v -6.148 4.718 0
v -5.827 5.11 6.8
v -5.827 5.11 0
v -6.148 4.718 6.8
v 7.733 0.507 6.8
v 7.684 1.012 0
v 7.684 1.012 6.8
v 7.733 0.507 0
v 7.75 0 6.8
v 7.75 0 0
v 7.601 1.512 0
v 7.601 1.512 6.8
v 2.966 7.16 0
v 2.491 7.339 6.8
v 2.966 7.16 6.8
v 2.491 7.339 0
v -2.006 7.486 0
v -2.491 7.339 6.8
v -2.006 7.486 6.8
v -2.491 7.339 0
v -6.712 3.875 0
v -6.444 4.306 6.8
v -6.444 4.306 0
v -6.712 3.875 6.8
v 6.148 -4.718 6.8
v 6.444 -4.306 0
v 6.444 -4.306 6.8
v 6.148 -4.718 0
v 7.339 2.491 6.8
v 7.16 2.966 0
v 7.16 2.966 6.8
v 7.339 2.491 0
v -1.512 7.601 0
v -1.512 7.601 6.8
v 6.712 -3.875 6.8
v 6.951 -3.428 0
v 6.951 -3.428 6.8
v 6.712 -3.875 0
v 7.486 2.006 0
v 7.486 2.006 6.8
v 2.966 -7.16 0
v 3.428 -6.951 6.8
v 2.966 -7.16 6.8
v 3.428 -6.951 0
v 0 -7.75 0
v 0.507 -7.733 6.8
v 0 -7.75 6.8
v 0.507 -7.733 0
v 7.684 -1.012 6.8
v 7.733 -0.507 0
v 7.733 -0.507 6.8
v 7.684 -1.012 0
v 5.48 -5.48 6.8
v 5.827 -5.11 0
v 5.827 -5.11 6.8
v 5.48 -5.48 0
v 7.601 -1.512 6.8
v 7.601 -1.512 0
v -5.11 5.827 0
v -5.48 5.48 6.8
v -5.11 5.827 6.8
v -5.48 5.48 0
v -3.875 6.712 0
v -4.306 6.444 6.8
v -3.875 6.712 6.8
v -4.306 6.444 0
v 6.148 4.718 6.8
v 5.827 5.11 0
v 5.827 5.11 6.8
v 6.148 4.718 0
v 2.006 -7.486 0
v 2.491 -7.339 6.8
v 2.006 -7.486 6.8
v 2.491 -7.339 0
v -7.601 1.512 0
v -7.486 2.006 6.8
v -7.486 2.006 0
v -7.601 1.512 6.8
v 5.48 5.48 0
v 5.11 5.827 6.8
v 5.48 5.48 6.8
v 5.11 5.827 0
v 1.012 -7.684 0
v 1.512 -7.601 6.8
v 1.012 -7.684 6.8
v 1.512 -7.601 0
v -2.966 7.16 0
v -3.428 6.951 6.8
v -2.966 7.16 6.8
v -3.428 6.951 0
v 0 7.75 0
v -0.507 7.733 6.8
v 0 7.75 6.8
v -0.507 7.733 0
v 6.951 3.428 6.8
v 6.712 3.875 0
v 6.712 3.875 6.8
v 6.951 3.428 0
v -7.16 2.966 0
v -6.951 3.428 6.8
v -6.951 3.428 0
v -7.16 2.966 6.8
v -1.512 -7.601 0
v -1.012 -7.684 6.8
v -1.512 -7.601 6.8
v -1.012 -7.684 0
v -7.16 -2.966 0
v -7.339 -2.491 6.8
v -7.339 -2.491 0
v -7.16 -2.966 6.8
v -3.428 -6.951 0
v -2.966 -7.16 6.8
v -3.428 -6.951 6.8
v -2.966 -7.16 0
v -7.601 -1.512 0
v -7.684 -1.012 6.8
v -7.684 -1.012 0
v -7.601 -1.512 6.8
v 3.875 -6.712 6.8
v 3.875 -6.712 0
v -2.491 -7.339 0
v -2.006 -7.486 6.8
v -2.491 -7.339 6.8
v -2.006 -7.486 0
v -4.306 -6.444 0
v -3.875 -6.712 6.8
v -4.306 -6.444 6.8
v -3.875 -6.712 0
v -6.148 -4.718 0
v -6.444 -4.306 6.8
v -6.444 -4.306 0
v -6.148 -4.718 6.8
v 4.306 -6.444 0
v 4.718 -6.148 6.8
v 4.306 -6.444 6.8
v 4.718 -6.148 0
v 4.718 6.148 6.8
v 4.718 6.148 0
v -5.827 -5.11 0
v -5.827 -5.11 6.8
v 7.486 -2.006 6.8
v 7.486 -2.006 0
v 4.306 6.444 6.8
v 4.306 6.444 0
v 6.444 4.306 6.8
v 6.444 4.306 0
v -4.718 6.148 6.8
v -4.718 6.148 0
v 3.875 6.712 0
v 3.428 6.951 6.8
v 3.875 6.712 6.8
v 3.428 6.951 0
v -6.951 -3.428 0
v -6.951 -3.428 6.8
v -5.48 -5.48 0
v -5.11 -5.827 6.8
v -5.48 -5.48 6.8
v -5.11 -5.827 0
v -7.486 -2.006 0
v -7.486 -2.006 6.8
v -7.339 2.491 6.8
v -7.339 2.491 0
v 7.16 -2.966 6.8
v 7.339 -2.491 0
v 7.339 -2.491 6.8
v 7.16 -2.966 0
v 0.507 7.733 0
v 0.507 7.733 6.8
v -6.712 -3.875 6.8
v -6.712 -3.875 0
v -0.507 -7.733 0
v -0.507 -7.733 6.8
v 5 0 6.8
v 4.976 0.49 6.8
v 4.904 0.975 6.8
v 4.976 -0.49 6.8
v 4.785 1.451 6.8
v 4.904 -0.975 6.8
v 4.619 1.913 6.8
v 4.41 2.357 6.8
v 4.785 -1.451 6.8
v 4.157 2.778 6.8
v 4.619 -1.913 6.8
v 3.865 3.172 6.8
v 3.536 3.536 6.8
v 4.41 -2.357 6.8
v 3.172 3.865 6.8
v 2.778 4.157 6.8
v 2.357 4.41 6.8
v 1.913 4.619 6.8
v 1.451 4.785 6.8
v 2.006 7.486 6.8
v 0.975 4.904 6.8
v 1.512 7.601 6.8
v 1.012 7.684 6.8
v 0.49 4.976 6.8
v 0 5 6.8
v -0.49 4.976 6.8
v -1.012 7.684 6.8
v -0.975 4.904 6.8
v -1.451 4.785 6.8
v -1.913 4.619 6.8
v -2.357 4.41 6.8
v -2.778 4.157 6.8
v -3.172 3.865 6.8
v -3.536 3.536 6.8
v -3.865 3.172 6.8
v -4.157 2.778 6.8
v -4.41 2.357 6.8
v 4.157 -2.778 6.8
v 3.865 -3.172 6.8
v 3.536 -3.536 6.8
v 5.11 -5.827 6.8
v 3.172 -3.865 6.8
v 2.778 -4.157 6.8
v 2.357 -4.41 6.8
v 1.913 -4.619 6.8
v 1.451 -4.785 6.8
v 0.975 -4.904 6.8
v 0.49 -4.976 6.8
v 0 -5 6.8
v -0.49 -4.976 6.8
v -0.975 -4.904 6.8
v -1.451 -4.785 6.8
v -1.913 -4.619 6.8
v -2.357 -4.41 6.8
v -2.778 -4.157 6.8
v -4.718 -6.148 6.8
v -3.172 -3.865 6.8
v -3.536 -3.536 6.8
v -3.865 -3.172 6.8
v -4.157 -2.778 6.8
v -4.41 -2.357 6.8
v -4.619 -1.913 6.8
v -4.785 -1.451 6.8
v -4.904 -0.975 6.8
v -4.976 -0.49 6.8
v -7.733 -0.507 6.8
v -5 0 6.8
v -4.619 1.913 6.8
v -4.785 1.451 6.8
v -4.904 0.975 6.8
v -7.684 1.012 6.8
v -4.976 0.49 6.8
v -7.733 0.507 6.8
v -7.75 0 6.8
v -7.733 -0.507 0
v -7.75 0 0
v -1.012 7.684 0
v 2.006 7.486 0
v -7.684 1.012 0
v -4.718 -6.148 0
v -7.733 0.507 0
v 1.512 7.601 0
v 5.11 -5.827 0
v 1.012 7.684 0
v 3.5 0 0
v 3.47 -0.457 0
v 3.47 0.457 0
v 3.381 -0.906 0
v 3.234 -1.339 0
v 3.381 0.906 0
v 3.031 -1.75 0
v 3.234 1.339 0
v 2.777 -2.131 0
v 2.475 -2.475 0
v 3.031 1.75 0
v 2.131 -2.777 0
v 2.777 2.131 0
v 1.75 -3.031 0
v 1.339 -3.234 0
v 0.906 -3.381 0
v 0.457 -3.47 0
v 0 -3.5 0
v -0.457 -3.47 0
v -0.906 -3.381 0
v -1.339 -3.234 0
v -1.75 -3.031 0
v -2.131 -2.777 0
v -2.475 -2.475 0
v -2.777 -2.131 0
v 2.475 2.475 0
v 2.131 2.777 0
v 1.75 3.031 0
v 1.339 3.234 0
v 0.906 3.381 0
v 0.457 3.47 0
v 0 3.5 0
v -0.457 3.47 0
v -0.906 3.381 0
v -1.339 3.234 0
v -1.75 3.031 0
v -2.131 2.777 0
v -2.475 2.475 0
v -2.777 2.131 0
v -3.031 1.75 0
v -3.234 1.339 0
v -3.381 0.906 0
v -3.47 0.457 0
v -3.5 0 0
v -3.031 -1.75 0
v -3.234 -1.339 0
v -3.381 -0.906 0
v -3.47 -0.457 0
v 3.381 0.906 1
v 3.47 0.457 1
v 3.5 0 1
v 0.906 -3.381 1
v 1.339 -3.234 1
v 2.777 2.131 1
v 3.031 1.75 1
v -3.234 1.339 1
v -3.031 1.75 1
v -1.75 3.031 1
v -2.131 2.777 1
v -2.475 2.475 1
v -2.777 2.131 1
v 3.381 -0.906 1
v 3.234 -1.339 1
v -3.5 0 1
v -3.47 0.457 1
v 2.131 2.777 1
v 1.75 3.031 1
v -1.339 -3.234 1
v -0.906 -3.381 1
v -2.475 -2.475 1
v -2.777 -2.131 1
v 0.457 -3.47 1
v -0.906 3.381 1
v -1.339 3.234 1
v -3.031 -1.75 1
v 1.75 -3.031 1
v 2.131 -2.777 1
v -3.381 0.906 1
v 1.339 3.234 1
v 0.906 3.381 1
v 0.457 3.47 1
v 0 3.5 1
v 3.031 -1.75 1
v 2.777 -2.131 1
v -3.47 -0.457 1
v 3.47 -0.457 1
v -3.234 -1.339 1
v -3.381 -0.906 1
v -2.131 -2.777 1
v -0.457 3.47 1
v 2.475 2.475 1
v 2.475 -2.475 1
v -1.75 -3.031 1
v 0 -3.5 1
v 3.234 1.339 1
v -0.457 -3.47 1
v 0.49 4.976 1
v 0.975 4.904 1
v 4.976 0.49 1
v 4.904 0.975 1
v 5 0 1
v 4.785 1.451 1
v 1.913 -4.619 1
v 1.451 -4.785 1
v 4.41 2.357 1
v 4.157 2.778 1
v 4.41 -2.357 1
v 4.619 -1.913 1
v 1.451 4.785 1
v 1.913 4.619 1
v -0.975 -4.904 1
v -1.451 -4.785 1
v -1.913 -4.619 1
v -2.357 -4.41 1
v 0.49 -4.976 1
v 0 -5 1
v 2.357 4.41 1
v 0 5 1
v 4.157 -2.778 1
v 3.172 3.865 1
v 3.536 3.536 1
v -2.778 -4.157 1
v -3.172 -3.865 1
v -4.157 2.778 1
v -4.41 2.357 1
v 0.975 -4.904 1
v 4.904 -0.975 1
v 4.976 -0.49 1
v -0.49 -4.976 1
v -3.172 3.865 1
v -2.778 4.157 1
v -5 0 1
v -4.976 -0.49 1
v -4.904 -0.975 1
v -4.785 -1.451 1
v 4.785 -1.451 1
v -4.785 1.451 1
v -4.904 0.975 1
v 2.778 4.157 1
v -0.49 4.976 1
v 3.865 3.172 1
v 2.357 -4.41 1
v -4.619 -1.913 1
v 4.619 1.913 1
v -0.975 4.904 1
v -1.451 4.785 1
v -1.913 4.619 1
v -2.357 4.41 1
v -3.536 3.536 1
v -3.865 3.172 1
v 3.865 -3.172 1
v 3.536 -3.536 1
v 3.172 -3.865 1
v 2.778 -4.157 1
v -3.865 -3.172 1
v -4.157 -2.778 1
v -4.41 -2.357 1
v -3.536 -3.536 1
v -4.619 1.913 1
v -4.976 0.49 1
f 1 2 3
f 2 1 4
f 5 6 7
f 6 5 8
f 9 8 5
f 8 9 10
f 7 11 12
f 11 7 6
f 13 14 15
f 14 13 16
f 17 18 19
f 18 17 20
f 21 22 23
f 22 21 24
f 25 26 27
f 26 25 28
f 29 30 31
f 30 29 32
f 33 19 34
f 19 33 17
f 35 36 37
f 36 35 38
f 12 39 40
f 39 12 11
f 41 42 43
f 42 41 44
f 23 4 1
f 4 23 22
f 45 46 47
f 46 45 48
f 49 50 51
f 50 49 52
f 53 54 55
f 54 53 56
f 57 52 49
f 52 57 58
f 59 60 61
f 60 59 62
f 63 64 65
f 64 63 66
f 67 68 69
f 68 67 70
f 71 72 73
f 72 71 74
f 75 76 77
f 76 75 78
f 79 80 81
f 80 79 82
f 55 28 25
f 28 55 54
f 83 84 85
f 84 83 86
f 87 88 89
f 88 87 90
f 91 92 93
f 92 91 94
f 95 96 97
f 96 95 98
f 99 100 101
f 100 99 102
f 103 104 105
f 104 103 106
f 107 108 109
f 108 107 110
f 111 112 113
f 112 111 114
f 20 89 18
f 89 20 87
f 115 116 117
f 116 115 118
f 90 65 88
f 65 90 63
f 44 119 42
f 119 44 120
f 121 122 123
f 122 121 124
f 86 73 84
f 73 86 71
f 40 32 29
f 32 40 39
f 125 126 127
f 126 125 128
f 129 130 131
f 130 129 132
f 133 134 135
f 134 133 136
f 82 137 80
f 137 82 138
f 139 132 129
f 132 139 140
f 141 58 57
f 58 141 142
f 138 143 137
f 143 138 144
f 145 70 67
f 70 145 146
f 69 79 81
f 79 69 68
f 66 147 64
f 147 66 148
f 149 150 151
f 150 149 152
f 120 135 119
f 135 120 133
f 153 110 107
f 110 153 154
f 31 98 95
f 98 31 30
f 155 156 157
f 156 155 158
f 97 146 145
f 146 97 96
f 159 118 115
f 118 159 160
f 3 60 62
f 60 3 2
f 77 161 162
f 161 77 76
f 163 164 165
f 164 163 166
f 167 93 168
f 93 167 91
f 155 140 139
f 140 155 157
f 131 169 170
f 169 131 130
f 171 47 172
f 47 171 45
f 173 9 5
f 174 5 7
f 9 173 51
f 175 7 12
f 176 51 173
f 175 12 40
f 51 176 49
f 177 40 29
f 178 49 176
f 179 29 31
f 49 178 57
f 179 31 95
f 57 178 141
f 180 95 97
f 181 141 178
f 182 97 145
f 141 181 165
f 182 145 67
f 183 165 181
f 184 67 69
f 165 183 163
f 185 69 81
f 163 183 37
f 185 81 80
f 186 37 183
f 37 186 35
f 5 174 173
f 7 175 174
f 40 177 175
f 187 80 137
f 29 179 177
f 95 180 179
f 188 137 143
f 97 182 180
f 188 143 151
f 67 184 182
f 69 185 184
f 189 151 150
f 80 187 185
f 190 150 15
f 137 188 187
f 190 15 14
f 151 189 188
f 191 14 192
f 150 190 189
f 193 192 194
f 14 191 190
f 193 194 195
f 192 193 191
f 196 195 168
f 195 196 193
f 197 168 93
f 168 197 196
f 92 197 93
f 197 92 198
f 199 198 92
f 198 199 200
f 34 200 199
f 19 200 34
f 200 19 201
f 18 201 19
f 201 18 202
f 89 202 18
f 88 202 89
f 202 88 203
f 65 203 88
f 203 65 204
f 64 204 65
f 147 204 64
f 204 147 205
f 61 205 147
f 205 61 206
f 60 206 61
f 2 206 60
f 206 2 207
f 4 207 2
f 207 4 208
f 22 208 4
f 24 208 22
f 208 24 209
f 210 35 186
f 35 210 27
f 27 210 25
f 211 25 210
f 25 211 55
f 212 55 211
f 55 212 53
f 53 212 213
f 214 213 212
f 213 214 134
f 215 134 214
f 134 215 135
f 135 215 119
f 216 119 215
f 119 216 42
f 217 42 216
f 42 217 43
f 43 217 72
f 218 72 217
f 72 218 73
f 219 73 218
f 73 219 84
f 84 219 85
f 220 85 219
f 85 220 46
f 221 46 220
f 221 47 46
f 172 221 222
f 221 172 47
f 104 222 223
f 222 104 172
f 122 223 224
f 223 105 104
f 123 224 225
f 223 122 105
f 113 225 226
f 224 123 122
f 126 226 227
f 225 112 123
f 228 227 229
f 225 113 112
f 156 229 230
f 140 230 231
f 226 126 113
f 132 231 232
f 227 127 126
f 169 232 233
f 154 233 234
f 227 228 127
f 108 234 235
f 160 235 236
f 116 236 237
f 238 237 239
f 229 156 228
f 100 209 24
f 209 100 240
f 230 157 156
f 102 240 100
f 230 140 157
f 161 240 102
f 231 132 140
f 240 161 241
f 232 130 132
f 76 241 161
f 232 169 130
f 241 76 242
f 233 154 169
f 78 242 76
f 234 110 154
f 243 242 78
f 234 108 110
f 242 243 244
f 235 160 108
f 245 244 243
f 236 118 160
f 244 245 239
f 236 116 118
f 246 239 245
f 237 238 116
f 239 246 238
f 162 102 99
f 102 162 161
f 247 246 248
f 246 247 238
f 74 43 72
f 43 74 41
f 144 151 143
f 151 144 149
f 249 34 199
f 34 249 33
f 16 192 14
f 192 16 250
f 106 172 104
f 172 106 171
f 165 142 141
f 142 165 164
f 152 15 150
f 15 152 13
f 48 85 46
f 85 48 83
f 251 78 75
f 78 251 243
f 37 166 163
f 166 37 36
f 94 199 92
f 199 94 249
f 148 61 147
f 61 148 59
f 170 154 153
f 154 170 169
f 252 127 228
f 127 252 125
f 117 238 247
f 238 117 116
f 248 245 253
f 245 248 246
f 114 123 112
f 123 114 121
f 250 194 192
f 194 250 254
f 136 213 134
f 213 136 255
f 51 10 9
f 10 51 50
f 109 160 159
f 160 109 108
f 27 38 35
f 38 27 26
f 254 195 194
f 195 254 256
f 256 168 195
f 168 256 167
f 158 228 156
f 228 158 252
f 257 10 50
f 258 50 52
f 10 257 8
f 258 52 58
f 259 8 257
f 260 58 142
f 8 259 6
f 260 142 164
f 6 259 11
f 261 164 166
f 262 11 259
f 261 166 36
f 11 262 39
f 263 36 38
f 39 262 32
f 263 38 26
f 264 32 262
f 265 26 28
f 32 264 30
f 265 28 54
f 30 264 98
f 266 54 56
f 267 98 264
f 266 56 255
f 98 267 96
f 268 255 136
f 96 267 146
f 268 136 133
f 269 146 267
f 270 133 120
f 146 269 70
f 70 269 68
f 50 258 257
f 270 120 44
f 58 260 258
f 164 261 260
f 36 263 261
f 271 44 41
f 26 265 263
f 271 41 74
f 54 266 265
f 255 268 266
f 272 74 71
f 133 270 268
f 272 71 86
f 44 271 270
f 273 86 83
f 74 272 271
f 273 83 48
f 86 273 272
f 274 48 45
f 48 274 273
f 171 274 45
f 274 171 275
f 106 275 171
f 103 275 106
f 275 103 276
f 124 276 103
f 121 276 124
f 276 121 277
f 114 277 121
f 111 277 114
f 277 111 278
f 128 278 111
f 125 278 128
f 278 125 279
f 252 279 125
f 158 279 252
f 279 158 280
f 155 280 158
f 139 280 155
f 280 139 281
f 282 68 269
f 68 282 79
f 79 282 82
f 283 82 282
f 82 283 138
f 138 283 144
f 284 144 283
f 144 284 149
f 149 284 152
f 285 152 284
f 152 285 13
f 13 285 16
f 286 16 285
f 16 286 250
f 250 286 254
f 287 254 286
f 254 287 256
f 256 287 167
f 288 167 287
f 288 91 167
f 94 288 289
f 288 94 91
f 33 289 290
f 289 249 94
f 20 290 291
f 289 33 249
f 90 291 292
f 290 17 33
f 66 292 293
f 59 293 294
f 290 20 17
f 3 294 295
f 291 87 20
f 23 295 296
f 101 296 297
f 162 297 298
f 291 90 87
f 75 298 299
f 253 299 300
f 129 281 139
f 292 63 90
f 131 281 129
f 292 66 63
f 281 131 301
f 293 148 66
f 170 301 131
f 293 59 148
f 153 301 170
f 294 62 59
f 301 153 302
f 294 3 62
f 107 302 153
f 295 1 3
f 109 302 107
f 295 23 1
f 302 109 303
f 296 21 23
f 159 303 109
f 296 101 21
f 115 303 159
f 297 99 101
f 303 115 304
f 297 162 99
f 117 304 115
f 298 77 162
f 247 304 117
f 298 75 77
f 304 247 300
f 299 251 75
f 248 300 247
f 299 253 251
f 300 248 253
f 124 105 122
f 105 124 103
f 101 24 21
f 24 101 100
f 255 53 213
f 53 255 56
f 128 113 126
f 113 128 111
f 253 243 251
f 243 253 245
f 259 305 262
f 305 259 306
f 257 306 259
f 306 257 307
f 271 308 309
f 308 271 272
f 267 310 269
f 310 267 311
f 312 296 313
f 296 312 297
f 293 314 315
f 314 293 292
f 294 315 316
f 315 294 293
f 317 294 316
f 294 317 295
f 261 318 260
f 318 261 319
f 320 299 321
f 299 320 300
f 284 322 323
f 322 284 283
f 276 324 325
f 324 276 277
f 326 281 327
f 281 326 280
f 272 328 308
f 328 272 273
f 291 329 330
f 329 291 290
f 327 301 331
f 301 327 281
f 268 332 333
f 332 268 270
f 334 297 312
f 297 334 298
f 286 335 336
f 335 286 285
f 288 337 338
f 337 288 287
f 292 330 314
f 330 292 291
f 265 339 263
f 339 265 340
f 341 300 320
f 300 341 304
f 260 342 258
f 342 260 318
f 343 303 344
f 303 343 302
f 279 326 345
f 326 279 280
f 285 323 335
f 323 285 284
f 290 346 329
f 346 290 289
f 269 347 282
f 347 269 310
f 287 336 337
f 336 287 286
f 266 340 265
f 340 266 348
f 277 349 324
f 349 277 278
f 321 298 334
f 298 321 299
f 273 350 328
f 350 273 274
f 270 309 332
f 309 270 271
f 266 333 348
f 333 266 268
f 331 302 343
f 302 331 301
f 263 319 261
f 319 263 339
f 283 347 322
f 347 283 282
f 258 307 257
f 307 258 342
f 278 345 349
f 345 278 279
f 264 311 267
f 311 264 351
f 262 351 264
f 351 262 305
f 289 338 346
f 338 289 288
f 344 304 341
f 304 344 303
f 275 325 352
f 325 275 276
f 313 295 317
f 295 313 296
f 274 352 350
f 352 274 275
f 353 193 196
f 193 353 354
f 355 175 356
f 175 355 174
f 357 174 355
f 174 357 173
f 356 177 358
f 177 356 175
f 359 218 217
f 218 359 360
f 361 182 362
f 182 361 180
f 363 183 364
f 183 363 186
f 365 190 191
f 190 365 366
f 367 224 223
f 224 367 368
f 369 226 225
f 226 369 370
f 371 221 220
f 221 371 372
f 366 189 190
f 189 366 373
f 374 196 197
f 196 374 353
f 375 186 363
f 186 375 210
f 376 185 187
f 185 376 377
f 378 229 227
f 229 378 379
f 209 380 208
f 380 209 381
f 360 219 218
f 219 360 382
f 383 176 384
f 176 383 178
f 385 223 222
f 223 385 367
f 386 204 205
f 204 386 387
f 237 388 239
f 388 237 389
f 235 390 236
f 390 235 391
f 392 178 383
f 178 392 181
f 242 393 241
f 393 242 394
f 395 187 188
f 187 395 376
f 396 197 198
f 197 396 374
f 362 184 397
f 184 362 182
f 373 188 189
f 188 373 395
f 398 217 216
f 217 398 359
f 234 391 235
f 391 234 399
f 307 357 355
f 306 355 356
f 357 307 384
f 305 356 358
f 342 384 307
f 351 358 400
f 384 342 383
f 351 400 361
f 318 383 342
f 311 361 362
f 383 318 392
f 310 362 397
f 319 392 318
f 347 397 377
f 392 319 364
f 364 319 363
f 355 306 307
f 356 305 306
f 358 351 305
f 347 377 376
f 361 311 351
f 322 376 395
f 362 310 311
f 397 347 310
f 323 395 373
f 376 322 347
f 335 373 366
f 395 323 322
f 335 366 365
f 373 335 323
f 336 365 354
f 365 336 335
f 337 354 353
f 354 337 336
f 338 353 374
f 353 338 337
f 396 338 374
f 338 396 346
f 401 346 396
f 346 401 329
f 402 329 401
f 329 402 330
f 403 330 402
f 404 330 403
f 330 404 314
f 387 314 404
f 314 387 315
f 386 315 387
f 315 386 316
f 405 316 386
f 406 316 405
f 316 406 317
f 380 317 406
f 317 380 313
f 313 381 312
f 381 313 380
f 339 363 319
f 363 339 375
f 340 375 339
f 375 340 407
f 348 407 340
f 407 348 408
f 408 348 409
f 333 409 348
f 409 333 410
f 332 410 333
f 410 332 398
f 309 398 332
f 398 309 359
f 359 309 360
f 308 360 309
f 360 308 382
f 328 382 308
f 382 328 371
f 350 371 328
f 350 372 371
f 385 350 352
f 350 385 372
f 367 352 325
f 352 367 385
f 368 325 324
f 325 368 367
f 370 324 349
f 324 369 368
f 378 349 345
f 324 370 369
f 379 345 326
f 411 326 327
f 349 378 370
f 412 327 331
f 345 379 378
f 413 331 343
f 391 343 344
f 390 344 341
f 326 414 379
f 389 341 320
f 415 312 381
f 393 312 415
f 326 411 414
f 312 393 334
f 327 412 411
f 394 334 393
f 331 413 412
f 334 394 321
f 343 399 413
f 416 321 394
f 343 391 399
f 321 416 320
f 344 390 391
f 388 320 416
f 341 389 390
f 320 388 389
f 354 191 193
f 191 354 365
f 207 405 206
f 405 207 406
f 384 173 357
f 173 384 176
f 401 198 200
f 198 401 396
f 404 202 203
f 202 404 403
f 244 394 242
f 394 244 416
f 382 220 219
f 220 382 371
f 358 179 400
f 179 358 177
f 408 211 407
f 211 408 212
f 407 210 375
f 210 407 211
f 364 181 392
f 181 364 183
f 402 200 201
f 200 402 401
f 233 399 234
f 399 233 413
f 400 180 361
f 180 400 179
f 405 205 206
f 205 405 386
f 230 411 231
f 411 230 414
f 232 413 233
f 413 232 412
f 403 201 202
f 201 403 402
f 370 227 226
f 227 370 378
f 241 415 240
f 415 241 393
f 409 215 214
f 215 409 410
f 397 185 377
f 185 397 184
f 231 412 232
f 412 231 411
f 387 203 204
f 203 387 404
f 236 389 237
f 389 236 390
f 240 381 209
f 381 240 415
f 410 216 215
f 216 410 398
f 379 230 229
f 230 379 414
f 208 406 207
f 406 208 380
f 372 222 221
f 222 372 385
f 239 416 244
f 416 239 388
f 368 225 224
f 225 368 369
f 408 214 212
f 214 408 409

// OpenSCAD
// part_id: fp9
// name: Zodiac angle pointer bush
// source_drawing_ids: DRW-010
// units: mm
// revision: 0.1
// SPDX-License-Identifier: MIT

module part_fp9(
    outer_d = 15.5,
    through_d = 7.0,
    counterbore_d = 10.0,
    height = 6.8,
    counterbore_depth = 5.8
) {
    difference() {
        cylinder(d = outer_d, h = height, center = false, $fn = 96);
        translate([0, 0, -0.05]) cylinder(d = through_d, h = height + 0.1, center = false, $fn = 48);
        translate([0, 0, height - counterbore_depth])
            cylinder(d = counterbore_d, h = counterbore_depth + 0.05, center = false, $fn = 64);
    }
}

// ---- "main guard" ----
// Default to previewing when opened directly:
if (is_undef(__LIB_MODE__)) {
    part_fp9();
}
